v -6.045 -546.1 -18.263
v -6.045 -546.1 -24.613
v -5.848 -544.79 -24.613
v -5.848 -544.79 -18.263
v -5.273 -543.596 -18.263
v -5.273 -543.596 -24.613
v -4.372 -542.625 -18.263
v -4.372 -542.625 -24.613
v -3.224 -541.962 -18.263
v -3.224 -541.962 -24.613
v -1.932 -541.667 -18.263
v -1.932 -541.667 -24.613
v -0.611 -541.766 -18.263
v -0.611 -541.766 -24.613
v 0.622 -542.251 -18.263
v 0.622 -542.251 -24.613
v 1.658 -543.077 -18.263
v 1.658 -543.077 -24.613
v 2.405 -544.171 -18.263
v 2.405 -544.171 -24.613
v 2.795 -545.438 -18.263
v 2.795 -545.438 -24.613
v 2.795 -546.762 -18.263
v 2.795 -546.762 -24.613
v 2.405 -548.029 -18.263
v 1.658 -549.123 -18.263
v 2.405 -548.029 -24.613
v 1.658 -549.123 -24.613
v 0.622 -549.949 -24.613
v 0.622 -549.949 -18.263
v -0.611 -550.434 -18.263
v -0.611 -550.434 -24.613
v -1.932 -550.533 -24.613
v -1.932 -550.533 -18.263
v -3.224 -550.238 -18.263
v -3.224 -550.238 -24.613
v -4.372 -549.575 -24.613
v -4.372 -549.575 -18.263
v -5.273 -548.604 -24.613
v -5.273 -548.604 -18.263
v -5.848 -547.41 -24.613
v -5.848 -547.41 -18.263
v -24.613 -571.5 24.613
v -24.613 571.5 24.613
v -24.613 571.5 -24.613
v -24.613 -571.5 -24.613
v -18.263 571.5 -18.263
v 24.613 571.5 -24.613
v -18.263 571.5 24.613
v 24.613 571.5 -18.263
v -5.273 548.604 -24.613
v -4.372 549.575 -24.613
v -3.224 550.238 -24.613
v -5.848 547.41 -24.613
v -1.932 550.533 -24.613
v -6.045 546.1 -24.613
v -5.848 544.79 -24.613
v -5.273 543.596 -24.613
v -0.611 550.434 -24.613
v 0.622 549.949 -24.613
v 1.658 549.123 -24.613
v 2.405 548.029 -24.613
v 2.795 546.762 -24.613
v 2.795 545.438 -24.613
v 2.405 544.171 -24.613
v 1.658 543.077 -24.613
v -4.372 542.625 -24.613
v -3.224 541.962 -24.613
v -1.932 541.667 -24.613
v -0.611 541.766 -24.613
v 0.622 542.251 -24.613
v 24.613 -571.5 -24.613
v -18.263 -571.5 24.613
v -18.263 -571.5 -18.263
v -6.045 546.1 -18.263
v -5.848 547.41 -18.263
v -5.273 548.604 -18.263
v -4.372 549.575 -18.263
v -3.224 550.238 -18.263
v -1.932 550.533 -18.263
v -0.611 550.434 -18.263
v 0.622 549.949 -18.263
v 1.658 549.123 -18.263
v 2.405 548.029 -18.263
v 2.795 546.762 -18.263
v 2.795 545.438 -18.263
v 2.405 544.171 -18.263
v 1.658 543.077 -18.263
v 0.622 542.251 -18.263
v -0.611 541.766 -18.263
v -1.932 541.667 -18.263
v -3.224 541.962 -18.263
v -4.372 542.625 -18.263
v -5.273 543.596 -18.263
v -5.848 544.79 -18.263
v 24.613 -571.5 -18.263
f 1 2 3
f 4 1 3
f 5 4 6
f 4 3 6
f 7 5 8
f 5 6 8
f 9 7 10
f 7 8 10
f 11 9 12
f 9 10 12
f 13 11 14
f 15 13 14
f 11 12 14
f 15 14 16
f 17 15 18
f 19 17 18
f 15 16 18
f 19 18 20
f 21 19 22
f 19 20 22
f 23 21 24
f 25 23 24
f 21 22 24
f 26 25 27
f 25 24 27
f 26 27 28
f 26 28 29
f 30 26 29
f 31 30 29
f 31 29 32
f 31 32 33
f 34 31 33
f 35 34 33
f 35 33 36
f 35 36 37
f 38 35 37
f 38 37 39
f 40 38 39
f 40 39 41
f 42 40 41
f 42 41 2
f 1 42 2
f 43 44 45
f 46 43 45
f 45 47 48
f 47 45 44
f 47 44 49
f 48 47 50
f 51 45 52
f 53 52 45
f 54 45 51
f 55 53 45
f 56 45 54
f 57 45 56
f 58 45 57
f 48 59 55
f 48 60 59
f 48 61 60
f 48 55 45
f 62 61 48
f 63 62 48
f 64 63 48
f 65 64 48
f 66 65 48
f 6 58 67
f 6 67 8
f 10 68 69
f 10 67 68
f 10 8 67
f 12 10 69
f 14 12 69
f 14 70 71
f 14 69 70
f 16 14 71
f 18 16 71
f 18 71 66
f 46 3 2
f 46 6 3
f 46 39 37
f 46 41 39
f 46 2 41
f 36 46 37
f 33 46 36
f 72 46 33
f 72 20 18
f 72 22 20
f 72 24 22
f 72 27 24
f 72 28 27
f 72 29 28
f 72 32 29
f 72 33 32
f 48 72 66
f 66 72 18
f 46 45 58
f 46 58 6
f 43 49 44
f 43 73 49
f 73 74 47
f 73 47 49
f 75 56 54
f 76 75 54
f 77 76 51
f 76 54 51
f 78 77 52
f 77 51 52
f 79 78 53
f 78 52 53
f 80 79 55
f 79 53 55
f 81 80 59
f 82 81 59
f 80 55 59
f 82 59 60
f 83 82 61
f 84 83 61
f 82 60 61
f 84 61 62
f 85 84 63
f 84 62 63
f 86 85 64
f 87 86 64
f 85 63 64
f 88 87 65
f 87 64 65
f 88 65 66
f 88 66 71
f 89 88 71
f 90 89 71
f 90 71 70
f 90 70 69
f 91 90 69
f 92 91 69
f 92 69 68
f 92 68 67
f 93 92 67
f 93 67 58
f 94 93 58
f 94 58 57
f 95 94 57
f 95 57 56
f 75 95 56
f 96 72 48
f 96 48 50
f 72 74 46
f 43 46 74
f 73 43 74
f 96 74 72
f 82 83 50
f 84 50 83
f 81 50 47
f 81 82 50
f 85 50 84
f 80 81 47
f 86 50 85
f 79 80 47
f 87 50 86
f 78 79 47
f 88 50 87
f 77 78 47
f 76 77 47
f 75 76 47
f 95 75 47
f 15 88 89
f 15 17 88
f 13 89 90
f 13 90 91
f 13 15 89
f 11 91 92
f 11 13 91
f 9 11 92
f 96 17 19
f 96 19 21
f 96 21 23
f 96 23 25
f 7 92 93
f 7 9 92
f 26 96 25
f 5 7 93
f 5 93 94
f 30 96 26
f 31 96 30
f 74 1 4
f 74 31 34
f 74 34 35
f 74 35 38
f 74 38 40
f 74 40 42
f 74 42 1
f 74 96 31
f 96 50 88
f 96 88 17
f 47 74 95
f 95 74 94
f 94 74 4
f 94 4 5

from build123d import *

# Parameters (mm, degrees)
F1_DEPTH = 571.5
F3_D     = 8.89


with BuildPart() as f1:
    # F0 (on Front) → F1 (new body, symmetric)
    with BuildSketch(Plane.XZ):
        Polygon((-24.6126, -24.6126), (24.6126, -24.6126), (24.6126, -18.2626), (-18.2626, -18.2626), (-18.2626, 24.6126), (-24.6126, 24.6126), align=None)
    extrude(amount=F1_DEPTH, both=True)

    # F3 (through all)
    with Locations(Plane.XY.offset(-18.2626)):
        with Locations((-1.6002, -546.1), (-1.6002, 546.1)):
            Hole(F3_D / 2)


solid = f1.part
